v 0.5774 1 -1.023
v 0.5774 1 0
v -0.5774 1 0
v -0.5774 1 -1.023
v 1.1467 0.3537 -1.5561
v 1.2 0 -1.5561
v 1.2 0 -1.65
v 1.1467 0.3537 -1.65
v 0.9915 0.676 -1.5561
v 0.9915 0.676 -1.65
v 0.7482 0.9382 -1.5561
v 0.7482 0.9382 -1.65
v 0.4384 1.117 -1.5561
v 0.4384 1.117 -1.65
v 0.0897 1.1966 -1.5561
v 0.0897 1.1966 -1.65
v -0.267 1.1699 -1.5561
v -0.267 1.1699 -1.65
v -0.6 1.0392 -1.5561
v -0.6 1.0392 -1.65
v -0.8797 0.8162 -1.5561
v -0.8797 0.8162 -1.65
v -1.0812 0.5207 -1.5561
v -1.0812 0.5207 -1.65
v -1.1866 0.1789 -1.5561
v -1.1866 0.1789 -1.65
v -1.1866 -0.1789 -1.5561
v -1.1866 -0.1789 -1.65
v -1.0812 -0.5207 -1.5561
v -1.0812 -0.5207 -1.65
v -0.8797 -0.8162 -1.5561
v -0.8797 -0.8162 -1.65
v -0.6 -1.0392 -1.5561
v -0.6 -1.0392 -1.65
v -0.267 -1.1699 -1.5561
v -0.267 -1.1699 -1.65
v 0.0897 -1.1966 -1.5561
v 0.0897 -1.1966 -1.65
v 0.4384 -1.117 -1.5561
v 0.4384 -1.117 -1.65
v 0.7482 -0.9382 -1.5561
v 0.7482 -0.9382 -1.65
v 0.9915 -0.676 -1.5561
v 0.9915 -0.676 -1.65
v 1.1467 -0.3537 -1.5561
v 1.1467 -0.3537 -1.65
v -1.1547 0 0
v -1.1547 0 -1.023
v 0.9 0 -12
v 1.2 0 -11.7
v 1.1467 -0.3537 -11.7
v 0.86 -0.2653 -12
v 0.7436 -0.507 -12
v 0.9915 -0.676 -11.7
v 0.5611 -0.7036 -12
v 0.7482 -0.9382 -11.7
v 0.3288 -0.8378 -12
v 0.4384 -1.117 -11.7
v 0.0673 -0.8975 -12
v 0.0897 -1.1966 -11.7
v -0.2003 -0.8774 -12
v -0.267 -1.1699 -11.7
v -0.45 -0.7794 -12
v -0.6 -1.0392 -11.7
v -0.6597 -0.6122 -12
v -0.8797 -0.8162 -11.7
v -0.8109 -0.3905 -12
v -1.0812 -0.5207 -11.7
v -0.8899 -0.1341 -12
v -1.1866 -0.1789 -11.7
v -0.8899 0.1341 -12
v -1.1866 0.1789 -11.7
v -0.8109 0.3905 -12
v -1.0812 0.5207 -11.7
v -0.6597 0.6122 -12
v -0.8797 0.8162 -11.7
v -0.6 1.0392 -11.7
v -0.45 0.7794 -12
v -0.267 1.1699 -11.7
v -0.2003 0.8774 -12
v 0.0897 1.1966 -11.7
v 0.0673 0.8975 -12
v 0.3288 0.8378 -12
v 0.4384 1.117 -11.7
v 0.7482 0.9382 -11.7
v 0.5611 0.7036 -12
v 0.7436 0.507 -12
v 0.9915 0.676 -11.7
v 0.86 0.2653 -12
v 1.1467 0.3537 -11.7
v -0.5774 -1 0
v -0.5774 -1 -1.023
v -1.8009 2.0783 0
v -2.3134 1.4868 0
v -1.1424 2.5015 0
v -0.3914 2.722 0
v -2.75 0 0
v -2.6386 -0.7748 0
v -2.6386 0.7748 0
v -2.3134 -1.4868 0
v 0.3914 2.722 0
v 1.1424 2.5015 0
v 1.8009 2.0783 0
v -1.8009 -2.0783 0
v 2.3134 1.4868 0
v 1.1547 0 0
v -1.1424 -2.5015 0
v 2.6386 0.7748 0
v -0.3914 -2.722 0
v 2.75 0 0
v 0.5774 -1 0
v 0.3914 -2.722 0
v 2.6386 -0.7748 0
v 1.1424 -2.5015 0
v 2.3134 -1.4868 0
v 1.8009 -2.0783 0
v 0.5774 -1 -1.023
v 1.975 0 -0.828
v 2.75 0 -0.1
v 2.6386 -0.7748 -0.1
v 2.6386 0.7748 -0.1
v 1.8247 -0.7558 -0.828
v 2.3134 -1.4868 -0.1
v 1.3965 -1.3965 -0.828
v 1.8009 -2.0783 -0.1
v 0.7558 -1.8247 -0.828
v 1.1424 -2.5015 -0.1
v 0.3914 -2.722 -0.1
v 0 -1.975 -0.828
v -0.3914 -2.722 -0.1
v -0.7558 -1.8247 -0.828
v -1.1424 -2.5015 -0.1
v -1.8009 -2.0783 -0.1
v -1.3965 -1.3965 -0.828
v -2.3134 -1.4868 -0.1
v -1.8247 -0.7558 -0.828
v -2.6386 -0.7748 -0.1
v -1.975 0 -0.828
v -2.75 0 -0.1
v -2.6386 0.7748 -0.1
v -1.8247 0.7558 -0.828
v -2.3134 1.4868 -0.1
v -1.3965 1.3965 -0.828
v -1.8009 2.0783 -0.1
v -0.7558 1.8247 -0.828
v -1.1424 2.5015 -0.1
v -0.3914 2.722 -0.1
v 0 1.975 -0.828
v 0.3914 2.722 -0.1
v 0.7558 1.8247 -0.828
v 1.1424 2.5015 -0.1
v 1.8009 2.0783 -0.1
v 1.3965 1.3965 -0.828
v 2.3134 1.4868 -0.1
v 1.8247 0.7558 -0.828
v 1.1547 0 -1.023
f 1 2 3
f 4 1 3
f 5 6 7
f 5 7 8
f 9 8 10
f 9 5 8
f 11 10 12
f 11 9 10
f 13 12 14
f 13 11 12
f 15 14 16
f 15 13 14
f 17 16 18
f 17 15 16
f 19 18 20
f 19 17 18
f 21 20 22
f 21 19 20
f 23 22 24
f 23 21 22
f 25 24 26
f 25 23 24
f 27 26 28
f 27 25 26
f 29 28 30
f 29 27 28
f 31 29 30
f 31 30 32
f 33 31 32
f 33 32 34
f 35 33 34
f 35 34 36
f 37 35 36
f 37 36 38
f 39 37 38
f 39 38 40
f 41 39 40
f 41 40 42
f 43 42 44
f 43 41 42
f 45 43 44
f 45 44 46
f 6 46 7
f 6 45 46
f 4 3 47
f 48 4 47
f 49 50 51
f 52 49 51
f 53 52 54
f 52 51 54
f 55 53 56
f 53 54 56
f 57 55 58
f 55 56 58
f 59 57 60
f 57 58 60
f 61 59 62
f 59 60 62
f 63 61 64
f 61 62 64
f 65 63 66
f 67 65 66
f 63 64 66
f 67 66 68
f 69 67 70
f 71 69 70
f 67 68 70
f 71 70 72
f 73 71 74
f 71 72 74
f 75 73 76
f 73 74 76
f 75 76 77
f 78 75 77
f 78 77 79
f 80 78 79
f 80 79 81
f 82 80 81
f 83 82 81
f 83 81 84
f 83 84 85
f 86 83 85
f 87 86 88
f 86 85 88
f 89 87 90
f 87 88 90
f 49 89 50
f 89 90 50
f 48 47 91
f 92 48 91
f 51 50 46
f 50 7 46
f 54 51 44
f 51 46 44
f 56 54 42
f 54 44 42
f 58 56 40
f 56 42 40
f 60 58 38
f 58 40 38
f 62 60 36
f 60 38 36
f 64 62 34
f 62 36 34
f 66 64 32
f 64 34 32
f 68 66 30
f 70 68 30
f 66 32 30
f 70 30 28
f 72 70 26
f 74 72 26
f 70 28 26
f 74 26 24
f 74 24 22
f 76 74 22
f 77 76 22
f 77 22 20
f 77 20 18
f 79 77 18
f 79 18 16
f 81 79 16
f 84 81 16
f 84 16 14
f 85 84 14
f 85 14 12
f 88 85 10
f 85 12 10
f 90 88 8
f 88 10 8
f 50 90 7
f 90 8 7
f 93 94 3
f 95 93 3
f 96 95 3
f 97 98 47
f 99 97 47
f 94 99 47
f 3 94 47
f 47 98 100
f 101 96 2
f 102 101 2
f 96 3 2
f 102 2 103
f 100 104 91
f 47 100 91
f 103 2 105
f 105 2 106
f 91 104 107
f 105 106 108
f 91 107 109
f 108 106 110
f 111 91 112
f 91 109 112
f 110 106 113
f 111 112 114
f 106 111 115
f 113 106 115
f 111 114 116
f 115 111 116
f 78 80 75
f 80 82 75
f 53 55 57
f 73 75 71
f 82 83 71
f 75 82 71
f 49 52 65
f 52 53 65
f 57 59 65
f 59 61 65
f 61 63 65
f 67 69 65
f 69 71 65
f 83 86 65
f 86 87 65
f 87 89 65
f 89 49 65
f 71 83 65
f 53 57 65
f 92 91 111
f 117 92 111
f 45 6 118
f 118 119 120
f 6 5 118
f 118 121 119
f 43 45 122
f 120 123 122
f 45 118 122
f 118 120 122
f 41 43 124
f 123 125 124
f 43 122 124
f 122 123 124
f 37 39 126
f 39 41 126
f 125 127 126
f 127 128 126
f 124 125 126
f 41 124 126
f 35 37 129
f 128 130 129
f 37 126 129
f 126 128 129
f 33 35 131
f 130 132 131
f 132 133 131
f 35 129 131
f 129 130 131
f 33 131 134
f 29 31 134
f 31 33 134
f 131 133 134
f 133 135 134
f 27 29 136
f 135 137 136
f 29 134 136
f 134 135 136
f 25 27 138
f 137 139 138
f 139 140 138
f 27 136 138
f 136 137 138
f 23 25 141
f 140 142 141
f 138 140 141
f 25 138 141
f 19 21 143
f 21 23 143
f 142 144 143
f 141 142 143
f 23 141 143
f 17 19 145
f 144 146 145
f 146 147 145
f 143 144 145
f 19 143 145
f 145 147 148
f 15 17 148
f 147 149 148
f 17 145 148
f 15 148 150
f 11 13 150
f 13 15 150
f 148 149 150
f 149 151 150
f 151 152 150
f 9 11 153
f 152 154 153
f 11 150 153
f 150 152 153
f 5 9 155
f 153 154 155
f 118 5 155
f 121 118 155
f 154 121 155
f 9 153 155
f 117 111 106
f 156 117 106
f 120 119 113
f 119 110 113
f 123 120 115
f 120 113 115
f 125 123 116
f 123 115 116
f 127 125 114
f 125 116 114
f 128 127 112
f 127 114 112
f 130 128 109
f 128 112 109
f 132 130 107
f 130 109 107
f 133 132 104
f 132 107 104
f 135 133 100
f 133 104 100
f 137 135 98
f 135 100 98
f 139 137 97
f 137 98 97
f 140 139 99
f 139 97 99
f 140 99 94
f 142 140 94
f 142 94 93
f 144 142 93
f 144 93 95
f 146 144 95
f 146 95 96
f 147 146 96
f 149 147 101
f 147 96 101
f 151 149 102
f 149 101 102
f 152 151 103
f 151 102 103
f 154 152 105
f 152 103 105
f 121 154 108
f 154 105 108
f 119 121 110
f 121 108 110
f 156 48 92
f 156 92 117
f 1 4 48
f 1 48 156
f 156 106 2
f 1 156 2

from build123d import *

# Parameters (mm, degrees)
SHANK_TIP_CHAMFER_SIZE          = 0.3
COUNTERSUNK_HEAD_CHAMFER_SIZE   = 1.65
COUNTERSUNK_HEAD_CHAMFER_SIZE_2 = 1.55
HEX_DRIVE_CUT_DEPTH             = 1.023


with BuildPart() as part:
    # Screw Section → Screw Blank Revolve (revolve)
    with BuildSketch(Plane(origin=(0, 0, 0), x_dir=(1, 0, 0), z_dir=(0, 1, 0))):
        Polygon((0, 12), (1.2, 12), (1.2, 1.65), (2.75, 1.65), (2.75, 0), (0, 0), align=None)
    revolve(axis=Axis((0, 0, 10.123), (0, 0, -1)))

    # Shank Tip Chamfer
    shank_tip_chamfer_edges = [part.edges().sort_by_distance(p)[0] for p in [
        (-1.2, 0, -12),
    ]]
    chamfer(shank_tip_chamfer_edges, length=SHANK_TIP_CHAMFER_SIZE)

    # Countersunk Head Chamfer
    # the kernel refuses this chamfer: 1.65, 1.55 mm, written as the material it takes off along each edge
    with BuildSketch(Plane(origin=(0, 0, -1.65), x_dir=(1, 0, 0), z_dir=(0, 1, 0))) as countersunk_head_chamfer_piece_1_section:
        Polygon((2.75 - COUNTERSUNK_HEAD_CHAMFER_SIZE, 0), (2.75, -COUNTERSUNK_HEAD_CHAMFER_SIZE_2), (2.75, 0), align=None)
    countersunk_head_chamfer_piece_1 = revolve(axis=Axis((0, 0, -1.65), (0, 0, -1)), mode=Mode.PRIVATE)
    countersunk_head_chamfer_piece_1 = countersunk_head_chamfer_piece_1 - Plane(origin=(0, 0, -0.825037094), x_dir=(1, 0, 0), z_dir=(0, 0, 1)) * Cylinder(1.2, 11, mode=Mode.PRIVATE)
    add(countersunk_head_chamfer_piece_1, mode=Mode.SUBTRACT)

    # Hex Drive Sketch → Hex Drive Cut (cut)
    with BuildSketch(Plane.XY):
        Polygon((1.154700538, 0), (0.577350269, 1), (-0.577350269, 1), (-1.154700538, 0), (-0.577350269, -1), (0.577350269, -1), align=None)
    extrude(amount=-HEX_DRIVE_CUT_DEPTH, mode=Mode.SUBTRACT)


solid = part.part
